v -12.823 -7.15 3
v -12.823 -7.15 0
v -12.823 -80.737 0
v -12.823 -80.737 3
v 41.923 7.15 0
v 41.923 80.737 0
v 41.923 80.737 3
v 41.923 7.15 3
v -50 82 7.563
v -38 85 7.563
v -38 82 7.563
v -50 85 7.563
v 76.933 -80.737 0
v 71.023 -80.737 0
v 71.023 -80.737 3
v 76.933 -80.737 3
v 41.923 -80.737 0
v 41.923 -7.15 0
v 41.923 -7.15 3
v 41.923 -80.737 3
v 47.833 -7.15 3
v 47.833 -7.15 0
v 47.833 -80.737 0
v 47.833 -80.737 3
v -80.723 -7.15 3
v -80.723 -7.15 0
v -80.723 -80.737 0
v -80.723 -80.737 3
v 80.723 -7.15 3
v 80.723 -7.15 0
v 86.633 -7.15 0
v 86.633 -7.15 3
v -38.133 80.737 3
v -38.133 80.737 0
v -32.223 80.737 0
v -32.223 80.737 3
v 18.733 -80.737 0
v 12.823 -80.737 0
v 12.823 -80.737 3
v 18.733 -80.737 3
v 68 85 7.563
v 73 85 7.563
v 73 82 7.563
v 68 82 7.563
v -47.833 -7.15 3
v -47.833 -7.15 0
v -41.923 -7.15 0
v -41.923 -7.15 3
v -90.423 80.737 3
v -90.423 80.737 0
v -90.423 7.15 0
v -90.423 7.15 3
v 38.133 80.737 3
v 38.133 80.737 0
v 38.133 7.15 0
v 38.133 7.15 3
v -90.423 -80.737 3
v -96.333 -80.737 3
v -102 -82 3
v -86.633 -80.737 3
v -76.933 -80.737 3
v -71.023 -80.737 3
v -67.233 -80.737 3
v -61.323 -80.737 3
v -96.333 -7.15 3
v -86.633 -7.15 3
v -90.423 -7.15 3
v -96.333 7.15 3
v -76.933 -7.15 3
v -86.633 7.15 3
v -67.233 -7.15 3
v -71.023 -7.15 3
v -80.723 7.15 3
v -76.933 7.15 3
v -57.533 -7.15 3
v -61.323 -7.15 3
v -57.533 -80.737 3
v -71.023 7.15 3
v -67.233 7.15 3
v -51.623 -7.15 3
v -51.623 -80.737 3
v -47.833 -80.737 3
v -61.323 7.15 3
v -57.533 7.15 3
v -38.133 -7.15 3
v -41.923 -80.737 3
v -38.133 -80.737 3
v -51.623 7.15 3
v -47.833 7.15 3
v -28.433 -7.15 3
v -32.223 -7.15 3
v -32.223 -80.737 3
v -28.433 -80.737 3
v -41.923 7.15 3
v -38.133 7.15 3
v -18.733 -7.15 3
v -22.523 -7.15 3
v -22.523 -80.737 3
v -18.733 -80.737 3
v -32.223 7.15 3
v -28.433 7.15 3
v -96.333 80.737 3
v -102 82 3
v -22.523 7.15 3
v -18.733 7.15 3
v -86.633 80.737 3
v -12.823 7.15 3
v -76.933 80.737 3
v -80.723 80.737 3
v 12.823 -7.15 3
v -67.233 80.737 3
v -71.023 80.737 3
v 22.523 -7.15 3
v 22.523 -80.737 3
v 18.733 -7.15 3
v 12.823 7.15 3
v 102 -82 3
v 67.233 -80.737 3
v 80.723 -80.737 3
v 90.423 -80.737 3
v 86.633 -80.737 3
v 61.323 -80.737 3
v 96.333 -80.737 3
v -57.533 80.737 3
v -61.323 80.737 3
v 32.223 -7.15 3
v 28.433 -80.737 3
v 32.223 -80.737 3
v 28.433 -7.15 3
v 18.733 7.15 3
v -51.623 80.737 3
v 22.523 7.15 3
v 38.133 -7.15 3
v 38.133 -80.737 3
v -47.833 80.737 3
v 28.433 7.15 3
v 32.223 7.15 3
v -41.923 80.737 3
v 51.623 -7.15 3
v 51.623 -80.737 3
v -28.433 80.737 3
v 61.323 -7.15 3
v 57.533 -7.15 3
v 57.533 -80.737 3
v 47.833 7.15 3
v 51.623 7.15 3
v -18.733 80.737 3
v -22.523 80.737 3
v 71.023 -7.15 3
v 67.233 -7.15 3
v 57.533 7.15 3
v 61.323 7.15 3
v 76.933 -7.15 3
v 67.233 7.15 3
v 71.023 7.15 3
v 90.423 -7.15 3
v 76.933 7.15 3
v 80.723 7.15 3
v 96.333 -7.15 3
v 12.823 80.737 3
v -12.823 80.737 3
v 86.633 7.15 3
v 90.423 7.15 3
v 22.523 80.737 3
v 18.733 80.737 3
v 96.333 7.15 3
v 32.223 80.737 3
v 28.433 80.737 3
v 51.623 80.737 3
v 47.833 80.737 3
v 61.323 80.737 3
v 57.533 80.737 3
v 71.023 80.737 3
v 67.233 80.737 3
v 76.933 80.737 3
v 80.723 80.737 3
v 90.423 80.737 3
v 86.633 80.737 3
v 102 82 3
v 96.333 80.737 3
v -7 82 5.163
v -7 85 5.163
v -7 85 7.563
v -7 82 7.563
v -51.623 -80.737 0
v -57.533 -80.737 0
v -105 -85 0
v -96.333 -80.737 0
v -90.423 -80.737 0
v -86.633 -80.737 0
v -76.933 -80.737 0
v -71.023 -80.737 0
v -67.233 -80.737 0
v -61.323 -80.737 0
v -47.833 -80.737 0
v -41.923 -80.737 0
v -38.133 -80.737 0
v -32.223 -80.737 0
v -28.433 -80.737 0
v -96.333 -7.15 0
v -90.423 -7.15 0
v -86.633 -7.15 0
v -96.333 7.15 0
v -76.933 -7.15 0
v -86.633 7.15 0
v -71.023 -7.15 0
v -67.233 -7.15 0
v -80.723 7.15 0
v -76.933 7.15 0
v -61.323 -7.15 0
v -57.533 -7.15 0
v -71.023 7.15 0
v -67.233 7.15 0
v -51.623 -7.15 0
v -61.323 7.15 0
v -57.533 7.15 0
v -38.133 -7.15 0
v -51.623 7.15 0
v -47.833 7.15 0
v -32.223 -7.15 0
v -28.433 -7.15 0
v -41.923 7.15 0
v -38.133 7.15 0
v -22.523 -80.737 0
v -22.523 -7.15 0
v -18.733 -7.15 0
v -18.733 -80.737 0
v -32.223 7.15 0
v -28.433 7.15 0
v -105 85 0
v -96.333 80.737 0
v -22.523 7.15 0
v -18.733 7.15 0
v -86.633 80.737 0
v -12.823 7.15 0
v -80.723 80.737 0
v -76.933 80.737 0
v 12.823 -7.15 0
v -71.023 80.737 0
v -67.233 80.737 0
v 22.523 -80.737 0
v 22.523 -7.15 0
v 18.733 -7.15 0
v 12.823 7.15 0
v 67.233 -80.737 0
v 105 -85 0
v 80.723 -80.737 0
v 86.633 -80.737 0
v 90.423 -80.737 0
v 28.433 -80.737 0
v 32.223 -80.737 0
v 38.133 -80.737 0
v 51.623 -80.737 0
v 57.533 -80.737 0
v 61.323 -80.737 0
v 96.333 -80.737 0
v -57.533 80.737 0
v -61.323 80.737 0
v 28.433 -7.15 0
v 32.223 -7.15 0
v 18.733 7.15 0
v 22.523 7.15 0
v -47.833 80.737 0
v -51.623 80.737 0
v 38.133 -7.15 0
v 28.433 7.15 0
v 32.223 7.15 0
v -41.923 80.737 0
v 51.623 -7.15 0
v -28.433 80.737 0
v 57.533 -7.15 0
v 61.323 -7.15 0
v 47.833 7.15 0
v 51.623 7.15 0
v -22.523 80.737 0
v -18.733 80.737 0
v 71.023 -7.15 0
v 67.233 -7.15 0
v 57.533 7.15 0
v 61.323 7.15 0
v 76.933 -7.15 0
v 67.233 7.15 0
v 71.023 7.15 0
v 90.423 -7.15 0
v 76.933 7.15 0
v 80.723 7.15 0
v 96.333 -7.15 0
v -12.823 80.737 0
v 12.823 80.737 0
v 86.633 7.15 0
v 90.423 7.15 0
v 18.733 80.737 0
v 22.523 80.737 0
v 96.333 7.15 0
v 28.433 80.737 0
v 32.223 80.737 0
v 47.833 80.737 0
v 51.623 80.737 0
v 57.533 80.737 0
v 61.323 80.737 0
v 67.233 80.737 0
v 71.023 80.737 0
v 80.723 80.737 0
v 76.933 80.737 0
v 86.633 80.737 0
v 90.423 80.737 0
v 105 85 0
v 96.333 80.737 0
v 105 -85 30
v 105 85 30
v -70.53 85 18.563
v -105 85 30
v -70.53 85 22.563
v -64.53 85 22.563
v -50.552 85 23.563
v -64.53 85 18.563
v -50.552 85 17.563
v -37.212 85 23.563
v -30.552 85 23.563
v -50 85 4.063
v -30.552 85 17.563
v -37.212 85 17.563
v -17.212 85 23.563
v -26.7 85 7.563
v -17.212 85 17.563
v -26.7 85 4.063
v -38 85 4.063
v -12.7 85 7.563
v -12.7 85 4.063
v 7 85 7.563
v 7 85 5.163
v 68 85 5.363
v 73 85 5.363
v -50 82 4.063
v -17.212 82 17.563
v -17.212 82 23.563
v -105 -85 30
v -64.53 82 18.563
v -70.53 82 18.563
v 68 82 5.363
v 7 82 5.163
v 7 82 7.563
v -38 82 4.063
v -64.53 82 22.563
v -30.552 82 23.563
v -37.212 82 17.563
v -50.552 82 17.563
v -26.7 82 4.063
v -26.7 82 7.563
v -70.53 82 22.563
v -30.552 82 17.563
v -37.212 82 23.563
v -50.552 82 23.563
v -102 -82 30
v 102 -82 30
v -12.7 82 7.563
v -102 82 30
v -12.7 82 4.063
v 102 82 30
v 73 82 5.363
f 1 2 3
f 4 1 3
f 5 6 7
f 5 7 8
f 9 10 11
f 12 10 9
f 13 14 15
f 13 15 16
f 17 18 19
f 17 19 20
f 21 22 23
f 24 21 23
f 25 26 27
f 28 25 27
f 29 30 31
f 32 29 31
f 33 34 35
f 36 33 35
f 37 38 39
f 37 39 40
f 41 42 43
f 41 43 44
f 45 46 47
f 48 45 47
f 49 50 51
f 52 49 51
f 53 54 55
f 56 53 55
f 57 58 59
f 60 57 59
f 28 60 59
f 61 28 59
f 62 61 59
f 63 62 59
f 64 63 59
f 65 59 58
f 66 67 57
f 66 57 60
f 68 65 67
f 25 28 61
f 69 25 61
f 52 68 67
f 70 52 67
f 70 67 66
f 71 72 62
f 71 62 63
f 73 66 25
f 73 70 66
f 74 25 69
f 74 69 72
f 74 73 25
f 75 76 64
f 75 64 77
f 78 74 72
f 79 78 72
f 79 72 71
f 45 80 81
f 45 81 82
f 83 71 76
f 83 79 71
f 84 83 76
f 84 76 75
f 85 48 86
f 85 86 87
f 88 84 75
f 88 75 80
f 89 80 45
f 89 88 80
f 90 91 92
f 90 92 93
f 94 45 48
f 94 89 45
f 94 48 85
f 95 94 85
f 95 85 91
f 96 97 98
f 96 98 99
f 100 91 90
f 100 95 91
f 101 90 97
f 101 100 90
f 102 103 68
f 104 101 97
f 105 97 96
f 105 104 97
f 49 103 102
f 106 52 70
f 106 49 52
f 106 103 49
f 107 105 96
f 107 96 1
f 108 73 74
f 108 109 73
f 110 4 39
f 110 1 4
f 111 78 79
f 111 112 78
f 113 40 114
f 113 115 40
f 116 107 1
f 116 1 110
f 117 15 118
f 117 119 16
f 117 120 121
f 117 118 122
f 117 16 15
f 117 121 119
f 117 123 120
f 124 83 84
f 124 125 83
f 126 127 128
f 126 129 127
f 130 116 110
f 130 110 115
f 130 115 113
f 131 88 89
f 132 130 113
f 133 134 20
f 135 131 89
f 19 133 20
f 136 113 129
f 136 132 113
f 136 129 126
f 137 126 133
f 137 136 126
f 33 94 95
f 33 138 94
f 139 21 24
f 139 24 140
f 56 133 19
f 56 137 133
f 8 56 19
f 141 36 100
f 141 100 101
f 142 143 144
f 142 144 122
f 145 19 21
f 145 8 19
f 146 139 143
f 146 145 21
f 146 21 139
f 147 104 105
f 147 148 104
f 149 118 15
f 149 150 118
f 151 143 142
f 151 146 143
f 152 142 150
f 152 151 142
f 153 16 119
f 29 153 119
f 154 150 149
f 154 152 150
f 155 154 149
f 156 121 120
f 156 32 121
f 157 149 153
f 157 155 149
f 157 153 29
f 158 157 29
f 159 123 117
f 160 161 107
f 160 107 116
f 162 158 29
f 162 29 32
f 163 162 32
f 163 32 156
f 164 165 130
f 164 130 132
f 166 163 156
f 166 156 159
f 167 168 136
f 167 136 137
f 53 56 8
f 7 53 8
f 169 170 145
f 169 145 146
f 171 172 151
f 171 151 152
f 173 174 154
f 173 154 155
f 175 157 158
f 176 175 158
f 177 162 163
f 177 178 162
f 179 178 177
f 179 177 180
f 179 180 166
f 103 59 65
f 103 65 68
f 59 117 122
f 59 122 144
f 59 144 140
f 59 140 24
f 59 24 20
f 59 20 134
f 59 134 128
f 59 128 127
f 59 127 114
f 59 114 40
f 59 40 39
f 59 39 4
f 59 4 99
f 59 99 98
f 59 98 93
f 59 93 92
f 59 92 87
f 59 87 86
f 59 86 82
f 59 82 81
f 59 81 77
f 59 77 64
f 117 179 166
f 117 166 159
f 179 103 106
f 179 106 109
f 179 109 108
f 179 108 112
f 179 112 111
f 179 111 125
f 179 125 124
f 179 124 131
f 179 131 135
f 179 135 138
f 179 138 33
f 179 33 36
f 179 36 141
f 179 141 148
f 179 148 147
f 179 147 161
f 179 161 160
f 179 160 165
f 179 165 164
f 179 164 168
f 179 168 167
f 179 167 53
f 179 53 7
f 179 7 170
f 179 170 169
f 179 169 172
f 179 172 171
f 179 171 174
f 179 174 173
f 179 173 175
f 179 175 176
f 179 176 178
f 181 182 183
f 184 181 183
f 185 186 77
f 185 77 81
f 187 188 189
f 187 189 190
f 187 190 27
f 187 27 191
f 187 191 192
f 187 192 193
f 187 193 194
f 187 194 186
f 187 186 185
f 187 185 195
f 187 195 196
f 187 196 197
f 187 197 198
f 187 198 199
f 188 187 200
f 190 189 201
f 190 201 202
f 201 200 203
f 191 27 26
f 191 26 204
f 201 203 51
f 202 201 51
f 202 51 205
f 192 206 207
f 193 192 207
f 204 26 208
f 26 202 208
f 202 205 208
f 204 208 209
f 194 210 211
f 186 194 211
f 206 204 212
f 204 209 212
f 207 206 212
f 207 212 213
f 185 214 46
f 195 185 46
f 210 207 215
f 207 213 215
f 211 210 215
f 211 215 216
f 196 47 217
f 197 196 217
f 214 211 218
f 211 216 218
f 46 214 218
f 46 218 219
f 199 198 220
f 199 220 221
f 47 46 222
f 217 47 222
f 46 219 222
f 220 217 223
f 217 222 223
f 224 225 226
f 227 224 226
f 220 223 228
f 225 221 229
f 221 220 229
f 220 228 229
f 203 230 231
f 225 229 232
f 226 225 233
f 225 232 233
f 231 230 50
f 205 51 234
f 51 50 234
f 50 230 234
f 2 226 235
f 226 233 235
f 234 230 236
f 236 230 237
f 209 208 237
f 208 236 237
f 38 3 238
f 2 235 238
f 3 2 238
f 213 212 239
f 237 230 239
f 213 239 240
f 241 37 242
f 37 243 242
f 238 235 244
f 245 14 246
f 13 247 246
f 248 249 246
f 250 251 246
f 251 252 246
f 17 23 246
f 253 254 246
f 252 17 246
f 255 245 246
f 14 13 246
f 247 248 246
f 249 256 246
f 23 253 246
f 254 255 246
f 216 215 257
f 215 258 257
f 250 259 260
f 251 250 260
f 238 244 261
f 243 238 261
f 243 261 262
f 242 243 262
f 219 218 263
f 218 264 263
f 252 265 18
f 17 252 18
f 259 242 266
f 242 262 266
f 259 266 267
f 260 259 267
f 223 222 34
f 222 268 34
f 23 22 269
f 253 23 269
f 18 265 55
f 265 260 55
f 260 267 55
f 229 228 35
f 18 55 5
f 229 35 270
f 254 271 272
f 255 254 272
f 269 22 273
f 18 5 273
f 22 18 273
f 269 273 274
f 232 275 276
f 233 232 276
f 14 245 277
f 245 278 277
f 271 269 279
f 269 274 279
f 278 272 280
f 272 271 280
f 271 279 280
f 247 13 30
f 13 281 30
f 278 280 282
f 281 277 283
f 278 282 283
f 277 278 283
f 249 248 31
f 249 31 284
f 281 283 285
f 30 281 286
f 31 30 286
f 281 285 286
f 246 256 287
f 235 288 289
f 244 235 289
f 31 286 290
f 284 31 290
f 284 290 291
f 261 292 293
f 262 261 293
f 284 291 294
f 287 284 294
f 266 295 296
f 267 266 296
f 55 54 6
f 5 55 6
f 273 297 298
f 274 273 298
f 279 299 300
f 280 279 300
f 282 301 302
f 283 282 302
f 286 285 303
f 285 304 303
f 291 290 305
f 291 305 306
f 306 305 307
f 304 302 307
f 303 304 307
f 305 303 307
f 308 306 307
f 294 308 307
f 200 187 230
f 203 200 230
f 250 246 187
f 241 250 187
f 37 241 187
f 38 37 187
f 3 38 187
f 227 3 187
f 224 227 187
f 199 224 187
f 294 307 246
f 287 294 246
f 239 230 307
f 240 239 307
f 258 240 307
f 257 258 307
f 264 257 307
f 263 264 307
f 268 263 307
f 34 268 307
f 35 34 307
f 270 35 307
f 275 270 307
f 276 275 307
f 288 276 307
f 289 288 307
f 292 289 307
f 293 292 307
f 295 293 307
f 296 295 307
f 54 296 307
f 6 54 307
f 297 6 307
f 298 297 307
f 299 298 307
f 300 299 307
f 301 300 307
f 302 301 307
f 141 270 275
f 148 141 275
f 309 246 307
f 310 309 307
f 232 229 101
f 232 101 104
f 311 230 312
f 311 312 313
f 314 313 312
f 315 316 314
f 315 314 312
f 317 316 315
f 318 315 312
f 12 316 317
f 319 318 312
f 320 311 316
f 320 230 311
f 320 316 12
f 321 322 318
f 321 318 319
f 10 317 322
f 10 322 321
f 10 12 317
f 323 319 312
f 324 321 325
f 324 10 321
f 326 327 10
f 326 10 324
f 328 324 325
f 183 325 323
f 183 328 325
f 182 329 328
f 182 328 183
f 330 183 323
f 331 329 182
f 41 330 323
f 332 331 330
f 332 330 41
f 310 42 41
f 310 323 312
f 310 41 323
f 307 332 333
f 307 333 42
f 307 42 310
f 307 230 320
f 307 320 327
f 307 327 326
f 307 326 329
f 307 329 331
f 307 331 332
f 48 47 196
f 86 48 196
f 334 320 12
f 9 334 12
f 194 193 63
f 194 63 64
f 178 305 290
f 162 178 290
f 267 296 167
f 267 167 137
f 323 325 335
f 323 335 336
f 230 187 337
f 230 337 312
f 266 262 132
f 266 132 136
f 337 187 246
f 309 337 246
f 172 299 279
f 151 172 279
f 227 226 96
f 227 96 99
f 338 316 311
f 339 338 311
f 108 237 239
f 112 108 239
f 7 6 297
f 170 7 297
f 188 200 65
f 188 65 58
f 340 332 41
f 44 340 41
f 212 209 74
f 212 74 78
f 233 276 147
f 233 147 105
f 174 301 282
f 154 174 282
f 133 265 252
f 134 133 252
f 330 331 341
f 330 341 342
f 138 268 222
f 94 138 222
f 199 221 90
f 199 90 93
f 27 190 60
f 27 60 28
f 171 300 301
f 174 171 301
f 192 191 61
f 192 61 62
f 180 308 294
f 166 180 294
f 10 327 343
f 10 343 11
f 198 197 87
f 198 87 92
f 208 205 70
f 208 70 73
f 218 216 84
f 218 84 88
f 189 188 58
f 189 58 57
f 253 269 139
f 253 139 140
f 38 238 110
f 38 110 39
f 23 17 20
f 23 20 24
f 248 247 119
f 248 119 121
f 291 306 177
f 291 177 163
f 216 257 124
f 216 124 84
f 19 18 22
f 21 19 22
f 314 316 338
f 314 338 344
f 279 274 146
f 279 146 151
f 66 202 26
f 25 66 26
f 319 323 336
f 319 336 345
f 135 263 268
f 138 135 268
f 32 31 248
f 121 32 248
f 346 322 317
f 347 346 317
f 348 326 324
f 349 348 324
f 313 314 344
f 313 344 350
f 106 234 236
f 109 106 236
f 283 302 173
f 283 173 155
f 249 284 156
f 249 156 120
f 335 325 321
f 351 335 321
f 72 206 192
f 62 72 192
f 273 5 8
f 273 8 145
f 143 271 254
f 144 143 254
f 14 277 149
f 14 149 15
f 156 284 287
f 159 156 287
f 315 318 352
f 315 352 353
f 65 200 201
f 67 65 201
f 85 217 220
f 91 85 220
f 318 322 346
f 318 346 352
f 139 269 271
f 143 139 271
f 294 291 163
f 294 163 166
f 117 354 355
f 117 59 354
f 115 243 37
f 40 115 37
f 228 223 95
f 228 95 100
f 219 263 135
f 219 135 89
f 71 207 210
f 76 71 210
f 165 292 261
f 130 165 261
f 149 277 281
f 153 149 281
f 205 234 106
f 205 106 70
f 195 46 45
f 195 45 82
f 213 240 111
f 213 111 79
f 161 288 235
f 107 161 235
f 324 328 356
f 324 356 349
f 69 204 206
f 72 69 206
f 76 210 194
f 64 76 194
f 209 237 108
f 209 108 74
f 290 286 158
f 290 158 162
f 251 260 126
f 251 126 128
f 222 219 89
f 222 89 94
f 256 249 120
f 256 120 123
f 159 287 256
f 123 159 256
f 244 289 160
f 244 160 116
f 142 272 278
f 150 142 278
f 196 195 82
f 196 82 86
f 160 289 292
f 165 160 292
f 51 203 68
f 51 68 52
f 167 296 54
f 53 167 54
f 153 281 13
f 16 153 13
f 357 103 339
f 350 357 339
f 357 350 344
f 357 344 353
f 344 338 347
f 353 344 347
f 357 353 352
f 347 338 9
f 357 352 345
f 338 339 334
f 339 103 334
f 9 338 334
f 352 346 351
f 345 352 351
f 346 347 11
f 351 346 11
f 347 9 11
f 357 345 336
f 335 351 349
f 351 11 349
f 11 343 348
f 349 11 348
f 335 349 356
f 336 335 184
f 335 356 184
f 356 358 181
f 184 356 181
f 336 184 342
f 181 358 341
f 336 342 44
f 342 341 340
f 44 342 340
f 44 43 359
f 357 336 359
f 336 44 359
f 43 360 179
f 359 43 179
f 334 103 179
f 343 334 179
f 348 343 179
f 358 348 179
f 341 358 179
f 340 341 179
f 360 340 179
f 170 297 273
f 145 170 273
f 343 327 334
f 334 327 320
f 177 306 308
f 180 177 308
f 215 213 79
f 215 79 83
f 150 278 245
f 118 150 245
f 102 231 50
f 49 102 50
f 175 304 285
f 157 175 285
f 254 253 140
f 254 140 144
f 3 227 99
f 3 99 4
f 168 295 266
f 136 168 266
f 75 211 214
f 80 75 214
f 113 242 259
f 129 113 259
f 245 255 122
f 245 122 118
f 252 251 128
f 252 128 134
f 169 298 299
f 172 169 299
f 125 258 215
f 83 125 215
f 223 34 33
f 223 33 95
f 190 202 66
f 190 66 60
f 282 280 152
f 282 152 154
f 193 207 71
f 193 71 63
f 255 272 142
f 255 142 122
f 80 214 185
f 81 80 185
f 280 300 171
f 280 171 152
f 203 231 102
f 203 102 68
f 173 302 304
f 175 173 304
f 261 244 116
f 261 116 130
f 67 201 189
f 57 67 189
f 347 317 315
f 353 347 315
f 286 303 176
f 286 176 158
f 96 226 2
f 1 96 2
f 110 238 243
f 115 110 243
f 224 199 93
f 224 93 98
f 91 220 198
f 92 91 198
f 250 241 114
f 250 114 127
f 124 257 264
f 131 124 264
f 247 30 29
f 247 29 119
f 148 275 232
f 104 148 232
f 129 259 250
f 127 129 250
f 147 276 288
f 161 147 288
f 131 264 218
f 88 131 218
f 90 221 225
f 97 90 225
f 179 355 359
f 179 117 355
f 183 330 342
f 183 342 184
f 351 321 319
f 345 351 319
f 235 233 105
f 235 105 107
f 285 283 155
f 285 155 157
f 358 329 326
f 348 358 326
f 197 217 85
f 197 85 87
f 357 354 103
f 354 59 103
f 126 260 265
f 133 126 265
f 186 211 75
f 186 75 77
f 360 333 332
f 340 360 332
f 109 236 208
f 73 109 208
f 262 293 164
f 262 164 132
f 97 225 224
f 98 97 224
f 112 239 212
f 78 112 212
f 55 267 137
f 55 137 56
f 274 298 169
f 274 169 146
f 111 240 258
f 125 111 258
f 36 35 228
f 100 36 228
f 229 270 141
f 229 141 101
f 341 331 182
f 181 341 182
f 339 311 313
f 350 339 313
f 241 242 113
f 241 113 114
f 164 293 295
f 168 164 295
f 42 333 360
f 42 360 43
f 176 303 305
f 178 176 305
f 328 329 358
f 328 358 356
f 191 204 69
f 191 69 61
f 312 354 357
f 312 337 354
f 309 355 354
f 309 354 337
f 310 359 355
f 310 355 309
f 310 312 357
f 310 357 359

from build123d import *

# Parameters (mm, degrees)
F0_W     = 210
F0_H     = 170
F1_DEPTH = 30
F2_T     = -3
F3_W     = 12
F3_H     = 3.5
F3_W_2   = 14
F3_H_2   = 2.4
F3_W_3   = 5
F3_H_3   = 2.2
F3_W_4   = 13.34
F3_H_4   = 6
F3_W_5   = 6
F3_H_5   = 4
F4_DEPTH = 25
F5_W     = 5.91059
F5_H     = 73.586922
F6_DEPTH = 25


with BuildPart() as f1:
    # F0 (on Top) → F1 (new body)
    with BuildSketch(Plane.XY):
        Rectangle(F0_W, F0_H)
    extrude(amount=F1_DEPTH)

    # F2
    f2_openings = [f1.faces().sort_by_distance(p)[0] for p in [
        (0, 0, 30),
    ]]
    offset(amount=F2_T, openings=f2_openings)

    # F3 (on face) → F4 (cut)
    with BuildSketch(Plane(origin=(0, 85, 0), x_dir=(-1, 0, 0), z_dir=(0, 1, 0))):
        with Locations((44, 5.812878)):
            Rectangle(F3_W, F3_H)
        with Locations((19.7, 5.812878)):
            Rectangle(F3_W_2, F3_H)
        with Locations((0, 6.362878)):
            Rectangle(F3_W_2, F3_H_2)
        with Locations((-70.5, 6.462878)):
            Rectangle(F3_W_3, F3_H_3)
        with Locations((43.881843, 20.562878)):
            Rectangle(F3_W_4, F3_H_4)
        with Locations((23.881843, 20.562878)):
            Rectangle(F3_W_4, F3_H_4)
        with Locations((67.530297, 20.562878)):
            Rectangle(F3_W_5, F3_H_5)
    extrude(amount=-F4_DEPTH, mode=Mode.SUBTRACT)

    # F5 (on face) → F6 (cut)
    with BuildSketch(Plane(origin=(0, 0, 0), x_dir=(1, 0, 0), z_dir=(0, 0, -1))):
        with Locations((-93.378186, 43.943266)):
            Rectangle(F5_W, F5_H)
        with Locations((-93.378186, -43.943266)):
            Rectangle(F5_W, F5_H)
        with Locations((-83.678186, 43.943266)):
            Rectangle(F5_W, F5_H)
        with Locations((-83.678186, -43.943266)):
            Rectangle(F5_W, F5_H)
        with Locations((-73.978186, 43.943266)):
            Rectangle(F5_W, F5_H)
        with Locations((-73.978186, -43.943266)):
            Rectangle(F5_W, F5_H)
        with Locations((-64.278186, 43.943266)):
            Rectangle(F5_W, F5_H)
        with Locations((-64.278186, -43.943266)):
            Rectangle(F5_W, F5_H)
        with Locations((-54.578186, 43.943266)):
            Rectangle(F5_W, F5_H)
        with Locations((-54.578186, -43.943266)):
            Rectangle(F5_W, F5_H)
        with Locations((-44.878186, 43.943266)):
            Rectangle(F5_W, F5_H)
        with Locations((-44.878186, -43.943266)):
            Rectangle(F5_W, F5_H)
        with Locations((-35.178186, 43.943266)):
            Rectangle(F5_W, F5_H)
        with Locations((-35.178186, -43.943266)):
            Rectangle(F5_W, F5_H)
        with Locations((-25.478186, 43.943266)):
            Rectangle(F5_W, F5_H)
        with Locations((-25.478186, -43.943266)):
            Rectangle(F5_W, F5_H)
        with Locations((-15.778186, 43.943266)):
            Rectangle(F5_W, F5_H)
        with Locations((-15.778186, -43.943266)):
            Rectangle(F5_W, F5_H)
        with Locations((93.378186, 43.943266)):
            Rectangle(F5_W, F5_H)
        with Locations((83.678186, 43.943266)):
            Rectangle(F5_W, F5_H)
        with Locations((73.978186, 43.943266)):
            Rectangle(F5_W, F5_H)
        with Locations((64.278186, 43.943266)):
            Rectangle(F5_W, F5_H)
        with Locations((54.578186, 43.943266)):
            Rectangle(F5_W, F5_H)
        with Locations((44.878186, 43.943266)):
            Rectangle(F5_W, F5_H)
        with Locations((35.178186, 43.943266)):
            Rectangle(F5_W, F5_H)
        with Locations((25.478186, 43.943266)):
            Rectangle(F5_W, F5_H)
        with Locations((15.778186, 43.943266)):
            Rectangle(F5_W, F5_H)
        with Locations((93.378186, -43.943266)):
            Rectangle(F5_W, F5_H)
        with Locations((83.678186, -43.943266)):
            Rectangle(F5_W, F5_H)
        with Locations((73.978186, -43.943266)):
            Rectangle(F5_W, F5_H)
        with Locations((64.278186, -43.943266)):
            Rectangle(F5_W, F5_H)
        with Locations((54.578186, -43.943266)):
            Rectangle(F5_W, F5_H)
        with Locations((44.878186, -43.943266)):
            Rectangle(F5_W, F5_H)
        with Locations((35.178186, -43.943266)):
            Rectangle(F5_W, F5_H)
        with Locations((25.478186, -43.943266)):
            Rectangle(F5_W, F5_H)
        with Locations((15.778186, -43.943266)):
            Rectangle(F5_W, F5_H)
    extrude(amount=-F6_DEPTH, mode=Mode.SUBTRACT)


solid = f1.part
